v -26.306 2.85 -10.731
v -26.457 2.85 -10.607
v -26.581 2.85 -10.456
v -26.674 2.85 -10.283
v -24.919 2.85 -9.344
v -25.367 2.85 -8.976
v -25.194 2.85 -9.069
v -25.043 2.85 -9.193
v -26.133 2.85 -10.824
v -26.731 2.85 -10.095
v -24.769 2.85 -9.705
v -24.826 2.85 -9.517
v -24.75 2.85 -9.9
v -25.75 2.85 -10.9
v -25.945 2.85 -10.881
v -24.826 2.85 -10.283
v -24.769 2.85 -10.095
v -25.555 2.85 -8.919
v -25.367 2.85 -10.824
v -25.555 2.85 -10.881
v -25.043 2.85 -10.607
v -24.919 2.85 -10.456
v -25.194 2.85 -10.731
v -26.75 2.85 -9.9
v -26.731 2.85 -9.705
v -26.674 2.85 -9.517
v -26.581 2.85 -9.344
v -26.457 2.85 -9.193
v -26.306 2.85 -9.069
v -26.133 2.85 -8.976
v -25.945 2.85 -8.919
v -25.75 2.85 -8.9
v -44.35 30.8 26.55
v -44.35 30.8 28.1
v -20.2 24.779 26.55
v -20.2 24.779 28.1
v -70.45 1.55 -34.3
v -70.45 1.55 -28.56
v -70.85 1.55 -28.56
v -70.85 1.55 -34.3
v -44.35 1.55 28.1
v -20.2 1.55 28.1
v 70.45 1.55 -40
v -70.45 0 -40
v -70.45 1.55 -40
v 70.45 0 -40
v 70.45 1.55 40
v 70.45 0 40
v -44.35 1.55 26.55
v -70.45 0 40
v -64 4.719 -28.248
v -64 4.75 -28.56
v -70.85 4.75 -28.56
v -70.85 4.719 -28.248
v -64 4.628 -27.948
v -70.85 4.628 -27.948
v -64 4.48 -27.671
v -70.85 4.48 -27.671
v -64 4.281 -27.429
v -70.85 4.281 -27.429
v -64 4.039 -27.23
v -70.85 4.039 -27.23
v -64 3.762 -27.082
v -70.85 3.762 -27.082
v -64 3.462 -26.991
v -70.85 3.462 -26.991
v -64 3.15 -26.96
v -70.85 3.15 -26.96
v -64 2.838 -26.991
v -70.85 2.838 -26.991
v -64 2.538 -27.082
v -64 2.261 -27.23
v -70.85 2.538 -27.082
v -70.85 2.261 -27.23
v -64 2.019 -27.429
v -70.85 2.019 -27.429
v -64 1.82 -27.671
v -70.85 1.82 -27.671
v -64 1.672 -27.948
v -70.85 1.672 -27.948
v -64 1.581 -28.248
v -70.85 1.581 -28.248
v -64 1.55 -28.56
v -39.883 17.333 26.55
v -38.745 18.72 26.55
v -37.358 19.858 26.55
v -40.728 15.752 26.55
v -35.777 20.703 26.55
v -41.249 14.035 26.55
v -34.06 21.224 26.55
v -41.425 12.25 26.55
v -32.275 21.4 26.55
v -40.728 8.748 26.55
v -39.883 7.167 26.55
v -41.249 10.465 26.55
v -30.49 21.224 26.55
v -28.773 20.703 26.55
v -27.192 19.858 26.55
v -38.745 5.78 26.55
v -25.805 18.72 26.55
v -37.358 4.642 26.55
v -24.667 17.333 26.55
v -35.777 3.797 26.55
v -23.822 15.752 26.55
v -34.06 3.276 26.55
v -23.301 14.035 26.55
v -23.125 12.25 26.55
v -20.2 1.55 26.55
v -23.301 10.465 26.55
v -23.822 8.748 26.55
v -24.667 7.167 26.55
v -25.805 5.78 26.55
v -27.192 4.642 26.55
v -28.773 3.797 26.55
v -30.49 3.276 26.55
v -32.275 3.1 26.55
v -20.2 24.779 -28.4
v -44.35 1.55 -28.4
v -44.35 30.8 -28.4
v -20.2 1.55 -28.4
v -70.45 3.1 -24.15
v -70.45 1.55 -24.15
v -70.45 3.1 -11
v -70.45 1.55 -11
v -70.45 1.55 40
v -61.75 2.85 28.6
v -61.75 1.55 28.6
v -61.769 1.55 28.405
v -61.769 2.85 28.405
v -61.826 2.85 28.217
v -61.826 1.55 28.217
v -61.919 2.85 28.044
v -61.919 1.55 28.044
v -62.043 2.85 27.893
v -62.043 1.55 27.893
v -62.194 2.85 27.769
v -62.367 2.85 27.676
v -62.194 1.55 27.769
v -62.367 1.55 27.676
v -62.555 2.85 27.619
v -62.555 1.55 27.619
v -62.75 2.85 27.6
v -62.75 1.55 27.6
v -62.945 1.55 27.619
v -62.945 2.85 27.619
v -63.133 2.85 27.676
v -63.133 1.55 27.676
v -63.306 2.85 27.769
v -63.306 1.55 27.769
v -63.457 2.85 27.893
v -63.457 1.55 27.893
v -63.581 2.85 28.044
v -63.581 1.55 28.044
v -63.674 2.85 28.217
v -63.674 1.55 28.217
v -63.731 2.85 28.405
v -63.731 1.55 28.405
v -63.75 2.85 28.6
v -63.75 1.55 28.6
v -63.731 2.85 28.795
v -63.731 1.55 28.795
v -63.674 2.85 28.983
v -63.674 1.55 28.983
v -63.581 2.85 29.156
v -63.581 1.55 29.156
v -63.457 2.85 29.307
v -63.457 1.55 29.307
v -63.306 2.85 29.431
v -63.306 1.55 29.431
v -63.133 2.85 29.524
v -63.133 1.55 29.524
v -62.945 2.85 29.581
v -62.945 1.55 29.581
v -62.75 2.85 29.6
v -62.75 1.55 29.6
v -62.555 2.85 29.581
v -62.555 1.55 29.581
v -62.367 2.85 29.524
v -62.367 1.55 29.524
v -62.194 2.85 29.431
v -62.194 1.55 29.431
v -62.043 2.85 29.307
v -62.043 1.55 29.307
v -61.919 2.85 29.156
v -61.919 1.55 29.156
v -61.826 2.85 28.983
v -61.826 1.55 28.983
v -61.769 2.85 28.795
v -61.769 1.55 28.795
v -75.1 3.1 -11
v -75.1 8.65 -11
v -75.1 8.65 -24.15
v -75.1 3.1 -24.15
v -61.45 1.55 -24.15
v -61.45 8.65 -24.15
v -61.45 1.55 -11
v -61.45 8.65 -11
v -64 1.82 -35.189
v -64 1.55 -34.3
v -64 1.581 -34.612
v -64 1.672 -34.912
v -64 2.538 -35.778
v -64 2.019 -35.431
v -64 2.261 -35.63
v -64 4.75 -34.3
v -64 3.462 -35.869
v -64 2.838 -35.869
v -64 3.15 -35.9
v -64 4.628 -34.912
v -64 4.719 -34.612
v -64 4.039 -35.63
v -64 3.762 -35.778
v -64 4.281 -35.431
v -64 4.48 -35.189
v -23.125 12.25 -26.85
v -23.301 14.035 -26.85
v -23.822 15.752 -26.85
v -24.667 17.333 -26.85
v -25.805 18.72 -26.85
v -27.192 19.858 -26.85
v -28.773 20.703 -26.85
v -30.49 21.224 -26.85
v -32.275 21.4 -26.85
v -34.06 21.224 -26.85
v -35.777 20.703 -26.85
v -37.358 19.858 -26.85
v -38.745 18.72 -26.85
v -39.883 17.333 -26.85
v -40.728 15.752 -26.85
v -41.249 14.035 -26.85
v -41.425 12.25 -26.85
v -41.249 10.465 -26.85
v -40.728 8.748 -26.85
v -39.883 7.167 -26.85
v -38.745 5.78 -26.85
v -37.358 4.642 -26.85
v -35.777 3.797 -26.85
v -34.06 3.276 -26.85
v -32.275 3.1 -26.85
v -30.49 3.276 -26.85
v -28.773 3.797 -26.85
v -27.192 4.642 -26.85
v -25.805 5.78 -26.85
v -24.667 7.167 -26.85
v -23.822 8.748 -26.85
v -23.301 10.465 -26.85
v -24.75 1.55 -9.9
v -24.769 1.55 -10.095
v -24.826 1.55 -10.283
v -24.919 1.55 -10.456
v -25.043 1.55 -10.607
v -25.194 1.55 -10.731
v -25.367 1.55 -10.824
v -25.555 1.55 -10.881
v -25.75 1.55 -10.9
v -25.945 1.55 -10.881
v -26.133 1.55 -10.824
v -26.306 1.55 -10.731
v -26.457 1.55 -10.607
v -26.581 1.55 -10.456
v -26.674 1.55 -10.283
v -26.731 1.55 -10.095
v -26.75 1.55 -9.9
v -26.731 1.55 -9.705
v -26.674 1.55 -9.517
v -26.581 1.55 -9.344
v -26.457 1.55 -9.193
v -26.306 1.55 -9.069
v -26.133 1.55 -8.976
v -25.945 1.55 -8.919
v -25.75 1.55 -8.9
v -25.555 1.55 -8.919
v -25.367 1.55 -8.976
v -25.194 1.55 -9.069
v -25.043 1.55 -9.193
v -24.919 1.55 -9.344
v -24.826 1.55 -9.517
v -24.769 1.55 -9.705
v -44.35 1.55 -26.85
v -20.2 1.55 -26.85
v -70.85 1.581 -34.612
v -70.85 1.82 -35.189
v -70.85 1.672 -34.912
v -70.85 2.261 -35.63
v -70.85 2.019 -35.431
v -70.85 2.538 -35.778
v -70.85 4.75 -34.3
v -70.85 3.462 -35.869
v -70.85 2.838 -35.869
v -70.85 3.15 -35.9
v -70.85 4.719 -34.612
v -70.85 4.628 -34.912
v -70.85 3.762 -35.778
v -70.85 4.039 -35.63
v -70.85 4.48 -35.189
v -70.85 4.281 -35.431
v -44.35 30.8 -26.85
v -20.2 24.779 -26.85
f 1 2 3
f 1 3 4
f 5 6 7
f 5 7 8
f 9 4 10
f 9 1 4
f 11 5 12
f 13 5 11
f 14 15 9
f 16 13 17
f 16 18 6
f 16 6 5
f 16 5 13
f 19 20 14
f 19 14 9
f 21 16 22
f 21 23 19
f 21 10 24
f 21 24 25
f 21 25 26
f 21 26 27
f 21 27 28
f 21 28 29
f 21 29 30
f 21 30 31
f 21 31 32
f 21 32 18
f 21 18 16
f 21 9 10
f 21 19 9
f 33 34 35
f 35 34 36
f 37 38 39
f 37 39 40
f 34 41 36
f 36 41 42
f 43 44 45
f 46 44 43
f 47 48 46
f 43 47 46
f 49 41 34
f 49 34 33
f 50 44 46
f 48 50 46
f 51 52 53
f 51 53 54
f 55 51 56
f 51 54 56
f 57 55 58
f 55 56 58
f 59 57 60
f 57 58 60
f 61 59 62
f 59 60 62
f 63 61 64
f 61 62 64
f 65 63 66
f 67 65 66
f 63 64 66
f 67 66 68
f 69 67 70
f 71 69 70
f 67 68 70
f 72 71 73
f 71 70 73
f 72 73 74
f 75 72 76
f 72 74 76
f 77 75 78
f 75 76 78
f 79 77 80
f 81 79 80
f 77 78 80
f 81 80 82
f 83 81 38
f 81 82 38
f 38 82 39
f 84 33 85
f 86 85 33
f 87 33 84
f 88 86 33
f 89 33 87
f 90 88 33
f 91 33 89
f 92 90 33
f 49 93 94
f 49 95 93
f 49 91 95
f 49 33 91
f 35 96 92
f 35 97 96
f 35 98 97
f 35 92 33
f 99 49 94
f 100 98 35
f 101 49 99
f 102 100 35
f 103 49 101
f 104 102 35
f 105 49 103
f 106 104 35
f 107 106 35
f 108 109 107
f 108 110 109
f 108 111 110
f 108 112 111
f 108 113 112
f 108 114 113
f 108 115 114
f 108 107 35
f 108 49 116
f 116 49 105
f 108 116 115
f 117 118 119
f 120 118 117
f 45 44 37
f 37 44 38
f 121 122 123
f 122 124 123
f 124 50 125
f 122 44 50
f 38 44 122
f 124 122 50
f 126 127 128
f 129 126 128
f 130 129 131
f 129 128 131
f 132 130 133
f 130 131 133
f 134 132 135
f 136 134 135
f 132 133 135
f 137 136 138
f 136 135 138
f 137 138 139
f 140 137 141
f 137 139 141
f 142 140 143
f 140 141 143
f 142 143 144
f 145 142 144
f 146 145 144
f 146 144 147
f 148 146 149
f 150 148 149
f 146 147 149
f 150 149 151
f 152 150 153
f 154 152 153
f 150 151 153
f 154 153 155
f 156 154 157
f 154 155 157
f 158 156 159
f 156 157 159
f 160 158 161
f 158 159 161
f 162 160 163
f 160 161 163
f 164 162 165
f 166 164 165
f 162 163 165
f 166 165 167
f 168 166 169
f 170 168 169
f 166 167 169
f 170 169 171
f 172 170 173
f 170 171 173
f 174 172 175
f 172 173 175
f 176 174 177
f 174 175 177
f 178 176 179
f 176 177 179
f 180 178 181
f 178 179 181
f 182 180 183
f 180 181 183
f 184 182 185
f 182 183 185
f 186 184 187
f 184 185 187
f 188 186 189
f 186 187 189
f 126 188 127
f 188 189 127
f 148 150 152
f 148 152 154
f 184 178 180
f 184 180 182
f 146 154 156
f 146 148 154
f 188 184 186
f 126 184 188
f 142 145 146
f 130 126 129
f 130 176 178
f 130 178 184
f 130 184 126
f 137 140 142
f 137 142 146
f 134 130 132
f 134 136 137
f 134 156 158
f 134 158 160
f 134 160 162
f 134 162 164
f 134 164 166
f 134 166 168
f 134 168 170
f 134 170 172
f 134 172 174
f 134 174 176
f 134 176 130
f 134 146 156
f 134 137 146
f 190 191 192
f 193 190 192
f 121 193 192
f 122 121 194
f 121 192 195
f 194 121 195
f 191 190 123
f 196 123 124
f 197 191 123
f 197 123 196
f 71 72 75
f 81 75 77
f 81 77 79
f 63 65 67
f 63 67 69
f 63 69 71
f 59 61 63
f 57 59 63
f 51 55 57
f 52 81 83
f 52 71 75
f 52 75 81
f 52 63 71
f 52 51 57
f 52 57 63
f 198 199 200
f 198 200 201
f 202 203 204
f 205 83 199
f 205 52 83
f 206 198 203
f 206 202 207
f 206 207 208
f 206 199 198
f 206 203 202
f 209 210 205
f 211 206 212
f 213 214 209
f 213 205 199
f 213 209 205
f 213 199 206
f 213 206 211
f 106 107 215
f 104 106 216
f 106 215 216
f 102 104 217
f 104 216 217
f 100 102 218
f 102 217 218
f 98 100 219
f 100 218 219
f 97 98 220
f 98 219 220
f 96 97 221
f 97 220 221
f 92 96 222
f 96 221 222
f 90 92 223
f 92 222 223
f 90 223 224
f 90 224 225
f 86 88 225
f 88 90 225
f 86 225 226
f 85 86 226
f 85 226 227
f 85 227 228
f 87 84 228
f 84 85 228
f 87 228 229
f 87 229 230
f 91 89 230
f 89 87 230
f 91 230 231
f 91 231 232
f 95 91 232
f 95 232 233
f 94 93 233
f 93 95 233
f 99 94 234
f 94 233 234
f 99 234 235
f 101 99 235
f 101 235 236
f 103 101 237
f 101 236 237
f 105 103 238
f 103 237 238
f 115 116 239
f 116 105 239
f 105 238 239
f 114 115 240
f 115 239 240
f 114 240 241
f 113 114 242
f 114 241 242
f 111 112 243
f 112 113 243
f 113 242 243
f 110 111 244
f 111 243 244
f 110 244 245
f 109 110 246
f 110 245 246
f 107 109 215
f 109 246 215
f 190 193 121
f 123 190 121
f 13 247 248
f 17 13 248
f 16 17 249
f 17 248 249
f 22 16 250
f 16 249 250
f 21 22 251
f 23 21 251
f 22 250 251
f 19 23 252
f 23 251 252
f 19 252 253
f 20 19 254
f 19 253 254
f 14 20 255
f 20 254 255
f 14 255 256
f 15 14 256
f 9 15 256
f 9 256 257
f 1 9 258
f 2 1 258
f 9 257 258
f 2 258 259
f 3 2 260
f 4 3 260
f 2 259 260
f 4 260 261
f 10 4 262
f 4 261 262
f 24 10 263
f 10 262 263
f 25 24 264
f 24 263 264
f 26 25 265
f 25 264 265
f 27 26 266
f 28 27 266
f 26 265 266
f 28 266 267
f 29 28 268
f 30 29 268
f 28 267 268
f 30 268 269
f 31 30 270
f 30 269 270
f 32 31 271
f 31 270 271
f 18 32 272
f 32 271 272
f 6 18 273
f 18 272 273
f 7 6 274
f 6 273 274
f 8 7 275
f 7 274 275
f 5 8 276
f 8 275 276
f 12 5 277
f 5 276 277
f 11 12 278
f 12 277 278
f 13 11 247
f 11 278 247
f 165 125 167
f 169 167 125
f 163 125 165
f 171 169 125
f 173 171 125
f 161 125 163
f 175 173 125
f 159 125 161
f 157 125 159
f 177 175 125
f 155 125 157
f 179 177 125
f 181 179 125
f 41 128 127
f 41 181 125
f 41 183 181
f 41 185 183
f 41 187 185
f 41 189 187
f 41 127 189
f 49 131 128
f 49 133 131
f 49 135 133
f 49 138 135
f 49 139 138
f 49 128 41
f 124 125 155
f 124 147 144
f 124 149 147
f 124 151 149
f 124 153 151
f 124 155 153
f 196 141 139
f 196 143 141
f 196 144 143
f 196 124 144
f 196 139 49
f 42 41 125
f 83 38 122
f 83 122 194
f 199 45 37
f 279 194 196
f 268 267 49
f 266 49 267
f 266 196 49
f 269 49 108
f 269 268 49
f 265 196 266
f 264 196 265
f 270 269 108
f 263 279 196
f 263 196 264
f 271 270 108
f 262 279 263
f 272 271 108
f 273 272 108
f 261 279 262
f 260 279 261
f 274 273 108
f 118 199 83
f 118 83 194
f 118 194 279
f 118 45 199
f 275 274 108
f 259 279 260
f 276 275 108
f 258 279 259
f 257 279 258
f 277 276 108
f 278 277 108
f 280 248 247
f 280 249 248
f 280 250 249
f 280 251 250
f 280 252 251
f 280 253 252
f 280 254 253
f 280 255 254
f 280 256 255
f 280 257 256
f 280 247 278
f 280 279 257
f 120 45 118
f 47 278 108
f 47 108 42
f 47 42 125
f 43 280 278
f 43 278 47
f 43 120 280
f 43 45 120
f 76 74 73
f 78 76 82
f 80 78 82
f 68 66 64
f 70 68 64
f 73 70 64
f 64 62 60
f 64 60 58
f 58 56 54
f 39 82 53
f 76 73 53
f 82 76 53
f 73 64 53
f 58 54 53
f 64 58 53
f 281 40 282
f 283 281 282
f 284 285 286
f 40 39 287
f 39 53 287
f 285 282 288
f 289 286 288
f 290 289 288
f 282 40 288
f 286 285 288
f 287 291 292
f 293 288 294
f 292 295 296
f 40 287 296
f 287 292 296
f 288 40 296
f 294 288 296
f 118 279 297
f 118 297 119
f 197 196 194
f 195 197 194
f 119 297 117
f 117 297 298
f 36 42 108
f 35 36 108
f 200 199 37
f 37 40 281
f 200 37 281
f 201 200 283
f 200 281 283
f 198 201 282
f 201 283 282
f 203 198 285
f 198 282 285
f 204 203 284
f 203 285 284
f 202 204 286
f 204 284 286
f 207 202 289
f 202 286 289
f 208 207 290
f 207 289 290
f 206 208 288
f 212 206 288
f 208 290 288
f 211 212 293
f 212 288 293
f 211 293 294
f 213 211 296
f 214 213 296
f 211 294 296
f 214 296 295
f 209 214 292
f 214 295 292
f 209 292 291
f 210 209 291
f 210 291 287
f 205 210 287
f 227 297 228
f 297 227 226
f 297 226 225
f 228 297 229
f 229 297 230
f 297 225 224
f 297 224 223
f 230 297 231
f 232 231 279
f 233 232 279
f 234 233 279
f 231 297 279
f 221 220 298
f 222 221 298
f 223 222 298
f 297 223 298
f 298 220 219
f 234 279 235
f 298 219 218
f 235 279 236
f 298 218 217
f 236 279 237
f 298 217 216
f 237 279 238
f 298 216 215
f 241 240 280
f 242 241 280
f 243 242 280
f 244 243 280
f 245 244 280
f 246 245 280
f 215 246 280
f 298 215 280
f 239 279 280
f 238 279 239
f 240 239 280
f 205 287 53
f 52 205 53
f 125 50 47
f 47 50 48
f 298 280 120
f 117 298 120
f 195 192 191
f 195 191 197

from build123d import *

# Parameters (mm, degrees)
SKETCH1_W                = 140.9
SKETCH1_H                = 80
PCB_DEPTH                = 1.55
BODYC_DEPTH              = 0.4
BODYC_DEPTH_BACK         = 6.45
SKETCH4_W                = 13.65
SKETCH4_H                = 13.15
BOSS_EXTRUDE4_DEPTH      = 7.1
BOSS_EXTRUDE4_DEPTH_BACK = 1.55
SKETCH5_W                = 4.65
SKETCH5_H                = 3.1
CUT_EXTRUDE3_DEPTH       = 14.1
SKETCH11_W               = 24.15
SKETCH11_H               = 1.55
BOSS_EXTRUDE8_DEPTH      = 29.25
SKETCH7_W                = 24.15
SKETCH7_H                = 1.55
BOSS_EXTRUDE5_DEPTH      = 29.25
CUT_EXTRUDE4_DEPTH       = 89
SKETCH12_R               = 9.15
BATTERY_DEPTH            = 54
SKETCH13_R               = 1
BUTTON_DEPTH             = 1.3
SKETCH14_R               = 1
RESET_DEPTH              = 1.3


with BuildPart() as part:
    # Sketch1 → PCB (new body)
    with BuildSketch(Plane(origin=(0, 0, 0), x_dir=(1, 0, 0), z_dir=(0, 1, 0))):
        Rectangle(SKETCH1_W, SKETCH1_H)
    extrude(amount=PCB_DEPTH)

    # Sketch3 → bodyC (add, two sides)
    with BuildSketch(Plane.ZY.offset(70.45)) as bodyc_sk:
        with BuildLine():
            Line((-34.3, 4.75), (-28.56, 4.75))
            ThreePointArc((-28.56, 4.75), (-26.96, 3.15), (-28.56, 1.55))
            Line((-28.56, 1.55), (-34.3, 1.55))
            ThreePointArc((-34.3, 1.55), (-35.9, 3.15), (-34.3, 4.75))
        make_face()
    extrude(amount=BODYC_DEPTH)
    extrude(bodyc_sk.sketch, amount=-BODYC_DEPTH_BACK)

    # Sketch4 → Boss-Extrude4 (add, two sides)
    with BuildSketch(Plane(origin=(0, 1.55, 0), x_dir=(1, 0, 0), z_dir=(0, 1, 0))) as boss_extrude4_sk:
        with Locations((-68.275, 17.575)):
            Rectangle(SKETCH4_W, SKETCH4_H)
    extrude(amount=BOSS_EXTRUDE4_DEPTH)
    extrude(boss_extrude4_sk.sketch, amount=-BOSS_EXTRUDE4_DEPTH_BACK)

    # Sketch5 → Cut-Extrude3 (cut)
    with BuildSketch(Plane.XY.offset(-11)):
        with Locations((-72.775, 1.55)):
            Rectangle(SKETCH5_W, SKETCH5_H)
    extrude(amount=-CUT_EXTRUDE3_DEPTH, mode=Mode.SUBTRACT)

    # Sketch11 → Boss-Extrude8 (add)
    with BuildSketch(Plane(origin=(0, 1.55, 0), x_dir=(1, 0, 0), z_dir=(0, 1, 0))):
        with Locations((-32.275, 27.625)):
            Rectangle(SKETCH11_W, SKETCH11_H)
    extrude(amount=BOSS_EXTRUDE8_DEPTH)

    # Sketch7 → Boss-Extrude5 (add)
    with BuildSketch(Plane(origin=(0, 1.55, 0), x_dir=(1, 0, 0), z_dir=(0, 1, 0))):
        with Locations((-32.275, -27.325)):
            Rectangle(SKETCH7_W, SKETCH7_H)
    extrude(amount=BOSS_EXTRUDE5_DEPTH)

    # Sketch8 → Cut-Extrude4 (cut)
    with BuildSketch(Plane.XY.offset(28.1)):
        Polygon((-44.35, 30.8), (-20.2, 24.778728731), (-20.2, 30.8), align=None)
    extrude(amount=-CUT_EXTRUDE4_DEPTH, mode=Mode.SUBTRACT)

    # Sketch12 → Battery (add)
    with BuildSketch(Plane.XY.offset(-26.85)):
        with Locations((-32.275, 12.25)):
            Circle(SKETCH12_R)
    extrude(amount=BATTERY_DEPTH)

    # Sketch13 → Button (add)
    with BuildSketch(Plane(origin=(0, 1.55, 0), x_dir=(1, 0, 0), z_dir=(0, 1, 0))):
        with Locations((-62.75, -28.6)):
            Circle(SKETCH13_R)
    extrude(amount=BUTTON_DEPTH)

    # Sketch14 → Reset (add)
    with BuildSketch(Plane(origin=(0, 1.55, 0), x_dir=(1, 0, 0), z_dir=(0, 1, 0))):
        with Locations((-25.75, 9.9)):
            Circle(SKETCH14_R)
    extrude(amount=RESET_DEPTH)


solid = part.part
